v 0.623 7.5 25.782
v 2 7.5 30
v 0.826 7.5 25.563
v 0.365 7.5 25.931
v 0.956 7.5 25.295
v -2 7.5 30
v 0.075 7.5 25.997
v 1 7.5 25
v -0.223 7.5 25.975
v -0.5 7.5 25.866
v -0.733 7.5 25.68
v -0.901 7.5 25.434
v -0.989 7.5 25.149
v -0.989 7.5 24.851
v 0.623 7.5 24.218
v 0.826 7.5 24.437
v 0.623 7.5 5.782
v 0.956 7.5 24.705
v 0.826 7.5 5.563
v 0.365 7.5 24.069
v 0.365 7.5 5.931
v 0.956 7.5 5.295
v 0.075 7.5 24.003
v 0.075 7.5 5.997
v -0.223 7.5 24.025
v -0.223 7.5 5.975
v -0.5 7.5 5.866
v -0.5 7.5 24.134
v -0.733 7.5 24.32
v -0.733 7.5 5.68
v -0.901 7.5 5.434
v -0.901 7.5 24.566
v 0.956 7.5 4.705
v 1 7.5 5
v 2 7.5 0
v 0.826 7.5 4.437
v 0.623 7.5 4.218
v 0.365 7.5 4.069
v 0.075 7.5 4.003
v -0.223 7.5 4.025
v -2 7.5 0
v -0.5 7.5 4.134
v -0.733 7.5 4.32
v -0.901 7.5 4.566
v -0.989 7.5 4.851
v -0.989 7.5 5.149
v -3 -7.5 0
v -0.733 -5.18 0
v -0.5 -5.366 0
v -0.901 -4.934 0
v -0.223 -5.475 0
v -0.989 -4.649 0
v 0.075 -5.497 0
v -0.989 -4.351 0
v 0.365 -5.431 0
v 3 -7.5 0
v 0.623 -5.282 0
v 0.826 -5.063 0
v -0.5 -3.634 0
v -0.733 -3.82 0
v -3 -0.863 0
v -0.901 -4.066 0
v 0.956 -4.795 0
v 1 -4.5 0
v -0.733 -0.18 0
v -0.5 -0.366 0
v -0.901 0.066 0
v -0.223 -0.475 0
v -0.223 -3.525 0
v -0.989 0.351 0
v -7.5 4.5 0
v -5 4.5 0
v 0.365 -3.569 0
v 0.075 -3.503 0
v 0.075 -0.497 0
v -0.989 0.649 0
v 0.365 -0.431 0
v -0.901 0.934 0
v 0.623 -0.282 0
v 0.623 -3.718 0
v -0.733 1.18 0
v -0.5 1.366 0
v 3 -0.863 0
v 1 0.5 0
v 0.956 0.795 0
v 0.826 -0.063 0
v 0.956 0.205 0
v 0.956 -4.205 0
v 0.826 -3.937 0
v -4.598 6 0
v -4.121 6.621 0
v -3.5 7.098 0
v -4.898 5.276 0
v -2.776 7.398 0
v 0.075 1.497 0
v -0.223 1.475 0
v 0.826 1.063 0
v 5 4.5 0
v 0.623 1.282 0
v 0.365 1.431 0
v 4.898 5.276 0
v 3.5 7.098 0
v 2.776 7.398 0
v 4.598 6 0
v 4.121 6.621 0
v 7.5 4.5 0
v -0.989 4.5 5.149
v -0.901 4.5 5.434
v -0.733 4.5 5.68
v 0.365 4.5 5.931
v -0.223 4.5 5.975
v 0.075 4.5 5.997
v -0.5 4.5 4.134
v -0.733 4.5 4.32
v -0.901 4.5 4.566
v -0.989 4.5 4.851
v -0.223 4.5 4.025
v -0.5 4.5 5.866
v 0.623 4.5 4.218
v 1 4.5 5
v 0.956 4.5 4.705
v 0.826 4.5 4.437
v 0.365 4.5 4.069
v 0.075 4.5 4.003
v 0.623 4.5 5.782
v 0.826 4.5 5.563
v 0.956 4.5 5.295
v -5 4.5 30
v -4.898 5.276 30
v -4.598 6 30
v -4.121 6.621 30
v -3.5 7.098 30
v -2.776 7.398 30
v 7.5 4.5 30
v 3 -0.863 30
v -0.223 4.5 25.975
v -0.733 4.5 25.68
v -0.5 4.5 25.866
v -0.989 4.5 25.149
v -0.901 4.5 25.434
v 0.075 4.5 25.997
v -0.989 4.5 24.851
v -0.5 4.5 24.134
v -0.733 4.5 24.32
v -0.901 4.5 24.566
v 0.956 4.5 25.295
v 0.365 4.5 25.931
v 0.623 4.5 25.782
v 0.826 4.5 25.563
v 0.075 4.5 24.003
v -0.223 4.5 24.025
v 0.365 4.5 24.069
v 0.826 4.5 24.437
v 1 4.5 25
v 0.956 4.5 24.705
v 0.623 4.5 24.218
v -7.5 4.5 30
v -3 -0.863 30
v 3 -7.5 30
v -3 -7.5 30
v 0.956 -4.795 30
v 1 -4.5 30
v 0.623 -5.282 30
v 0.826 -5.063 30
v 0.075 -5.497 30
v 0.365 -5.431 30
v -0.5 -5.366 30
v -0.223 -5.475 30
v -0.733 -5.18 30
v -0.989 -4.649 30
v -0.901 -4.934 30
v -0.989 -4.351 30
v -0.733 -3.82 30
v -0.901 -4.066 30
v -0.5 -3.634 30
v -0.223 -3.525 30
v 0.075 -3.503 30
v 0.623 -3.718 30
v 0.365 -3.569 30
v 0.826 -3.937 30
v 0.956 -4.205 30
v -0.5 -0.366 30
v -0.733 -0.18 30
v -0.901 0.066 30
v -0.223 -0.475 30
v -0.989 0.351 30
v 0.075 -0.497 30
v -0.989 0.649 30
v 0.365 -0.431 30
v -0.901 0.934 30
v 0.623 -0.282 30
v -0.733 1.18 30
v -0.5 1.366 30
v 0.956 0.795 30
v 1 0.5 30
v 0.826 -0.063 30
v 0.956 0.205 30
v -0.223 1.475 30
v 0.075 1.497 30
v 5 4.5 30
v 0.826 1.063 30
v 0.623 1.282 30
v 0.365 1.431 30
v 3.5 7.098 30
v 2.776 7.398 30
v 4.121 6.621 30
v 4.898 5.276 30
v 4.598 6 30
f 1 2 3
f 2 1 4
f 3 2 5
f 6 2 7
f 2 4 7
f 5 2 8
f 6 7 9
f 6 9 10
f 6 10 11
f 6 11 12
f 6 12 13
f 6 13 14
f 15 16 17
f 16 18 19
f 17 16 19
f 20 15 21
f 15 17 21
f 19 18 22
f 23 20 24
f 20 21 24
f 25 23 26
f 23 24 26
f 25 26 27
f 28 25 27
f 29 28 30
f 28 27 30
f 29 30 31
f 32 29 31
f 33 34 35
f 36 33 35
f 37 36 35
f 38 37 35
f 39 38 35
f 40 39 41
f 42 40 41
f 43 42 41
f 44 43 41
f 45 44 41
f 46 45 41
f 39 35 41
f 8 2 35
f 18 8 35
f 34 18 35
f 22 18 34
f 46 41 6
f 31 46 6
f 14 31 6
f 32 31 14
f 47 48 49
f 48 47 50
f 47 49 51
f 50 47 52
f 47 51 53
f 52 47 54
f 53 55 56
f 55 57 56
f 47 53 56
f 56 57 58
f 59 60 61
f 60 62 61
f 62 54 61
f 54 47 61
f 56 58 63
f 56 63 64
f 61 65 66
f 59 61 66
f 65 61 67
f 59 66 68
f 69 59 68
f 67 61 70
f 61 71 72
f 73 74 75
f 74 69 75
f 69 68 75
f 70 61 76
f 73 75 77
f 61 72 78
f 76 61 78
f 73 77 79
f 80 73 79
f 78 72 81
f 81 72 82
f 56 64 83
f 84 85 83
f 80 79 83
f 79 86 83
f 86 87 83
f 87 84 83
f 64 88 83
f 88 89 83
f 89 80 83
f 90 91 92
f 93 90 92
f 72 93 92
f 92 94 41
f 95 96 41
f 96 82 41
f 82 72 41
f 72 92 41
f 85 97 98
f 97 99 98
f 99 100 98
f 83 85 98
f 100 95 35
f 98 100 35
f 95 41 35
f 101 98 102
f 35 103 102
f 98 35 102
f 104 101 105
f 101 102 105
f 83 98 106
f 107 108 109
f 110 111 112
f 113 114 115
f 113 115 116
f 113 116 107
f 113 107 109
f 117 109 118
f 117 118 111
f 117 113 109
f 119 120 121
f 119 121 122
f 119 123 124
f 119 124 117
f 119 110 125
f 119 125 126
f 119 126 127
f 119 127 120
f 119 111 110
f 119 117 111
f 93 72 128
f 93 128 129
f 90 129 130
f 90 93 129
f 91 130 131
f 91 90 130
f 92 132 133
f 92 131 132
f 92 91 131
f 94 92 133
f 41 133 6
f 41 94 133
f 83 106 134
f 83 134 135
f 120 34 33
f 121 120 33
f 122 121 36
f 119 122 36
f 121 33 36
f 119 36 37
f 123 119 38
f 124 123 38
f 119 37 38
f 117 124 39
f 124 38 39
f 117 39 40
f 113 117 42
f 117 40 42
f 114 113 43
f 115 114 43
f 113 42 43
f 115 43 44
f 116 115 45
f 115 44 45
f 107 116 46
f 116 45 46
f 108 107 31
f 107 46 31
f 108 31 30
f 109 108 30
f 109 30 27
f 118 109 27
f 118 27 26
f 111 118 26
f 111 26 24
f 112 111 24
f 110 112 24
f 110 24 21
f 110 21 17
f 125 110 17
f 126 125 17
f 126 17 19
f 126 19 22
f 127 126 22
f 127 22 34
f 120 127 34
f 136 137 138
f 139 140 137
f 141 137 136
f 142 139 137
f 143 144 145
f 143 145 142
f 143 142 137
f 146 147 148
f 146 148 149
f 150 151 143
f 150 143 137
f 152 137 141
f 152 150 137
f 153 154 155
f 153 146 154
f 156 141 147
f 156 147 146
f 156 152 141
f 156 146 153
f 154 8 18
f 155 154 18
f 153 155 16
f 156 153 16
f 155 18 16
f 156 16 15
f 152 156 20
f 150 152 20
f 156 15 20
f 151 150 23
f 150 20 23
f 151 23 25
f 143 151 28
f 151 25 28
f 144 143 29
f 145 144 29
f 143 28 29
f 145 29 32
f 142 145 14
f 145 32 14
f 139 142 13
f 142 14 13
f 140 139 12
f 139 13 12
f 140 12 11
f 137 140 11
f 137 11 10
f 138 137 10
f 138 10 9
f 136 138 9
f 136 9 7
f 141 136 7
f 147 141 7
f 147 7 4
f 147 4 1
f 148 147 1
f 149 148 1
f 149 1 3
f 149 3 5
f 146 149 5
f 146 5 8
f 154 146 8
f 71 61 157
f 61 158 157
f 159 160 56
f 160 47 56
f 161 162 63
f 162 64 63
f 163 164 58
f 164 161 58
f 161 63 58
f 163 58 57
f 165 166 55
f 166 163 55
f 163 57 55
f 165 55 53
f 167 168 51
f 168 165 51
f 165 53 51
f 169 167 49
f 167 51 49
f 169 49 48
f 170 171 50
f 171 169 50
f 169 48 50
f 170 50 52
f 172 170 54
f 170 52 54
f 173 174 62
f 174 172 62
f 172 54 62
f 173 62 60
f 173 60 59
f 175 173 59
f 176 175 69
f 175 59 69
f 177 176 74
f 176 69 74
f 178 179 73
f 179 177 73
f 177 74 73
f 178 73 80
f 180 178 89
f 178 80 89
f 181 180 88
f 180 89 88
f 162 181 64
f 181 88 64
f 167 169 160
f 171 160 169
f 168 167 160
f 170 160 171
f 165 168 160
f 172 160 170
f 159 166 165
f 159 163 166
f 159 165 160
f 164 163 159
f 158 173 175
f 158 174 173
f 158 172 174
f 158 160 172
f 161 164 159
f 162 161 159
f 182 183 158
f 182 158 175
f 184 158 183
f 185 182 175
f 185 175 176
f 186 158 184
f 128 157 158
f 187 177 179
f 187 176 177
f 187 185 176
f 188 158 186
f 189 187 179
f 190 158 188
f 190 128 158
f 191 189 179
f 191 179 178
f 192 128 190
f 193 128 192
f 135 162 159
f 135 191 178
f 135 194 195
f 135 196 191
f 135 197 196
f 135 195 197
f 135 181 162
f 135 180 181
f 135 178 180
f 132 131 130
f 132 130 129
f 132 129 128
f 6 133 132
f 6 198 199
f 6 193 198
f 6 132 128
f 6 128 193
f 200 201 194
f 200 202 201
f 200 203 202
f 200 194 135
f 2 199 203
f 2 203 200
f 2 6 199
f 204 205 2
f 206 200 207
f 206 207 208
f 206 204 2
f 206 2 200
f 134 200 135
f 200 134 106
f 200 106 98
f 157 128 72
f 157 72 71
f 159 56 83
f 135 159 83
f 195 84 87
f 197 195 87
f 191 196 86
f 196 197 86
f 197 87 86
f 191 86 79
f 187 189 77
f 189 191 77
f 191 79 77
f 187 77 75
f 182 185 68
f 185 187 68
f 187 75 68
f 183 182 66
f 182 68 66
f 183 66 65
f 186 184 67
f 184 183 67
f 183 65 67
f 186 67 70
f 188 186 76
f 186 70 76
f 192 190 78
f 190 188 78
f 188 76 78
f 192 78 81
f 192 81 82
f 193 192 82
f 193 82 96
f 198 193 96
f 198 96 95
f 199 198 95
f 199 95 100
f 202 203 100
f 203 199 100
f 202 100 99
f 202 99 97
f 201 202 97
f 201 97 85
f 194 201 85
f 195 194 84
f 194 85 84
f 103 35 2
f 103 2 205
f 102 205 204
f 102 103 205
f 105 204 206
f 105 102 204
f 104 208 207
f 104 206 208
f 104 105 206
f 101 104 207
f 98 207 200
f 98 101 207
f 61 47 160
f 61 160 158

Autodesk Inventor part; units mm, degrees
ref_plane "YZ Plane" through (0, 0, 0) normal (1, 0, 0) x (0, 1, 0)
ref_plane "XZ Plane" through (0, 0, 0) normal (0, 1, 0) x (-1, 0, 0)
ref_plane "XY Plane" through (0, 0, 0) normal (0, 0, 1) x (1, 0, 0)
sketch "Sketch1" plane through (0, 0, 0) normal (0, 0, 1) x (1, 0, 0)
  line L0 (2, 7.5) -> (-2, 7.5)
  line L1 (-5, 4.5) -> (-5, -7.5)
  line L2 (-5, -7.5) -> (5, -7.5)
  line L3 (5, -7.5) -> (5, 4.5)
  line L4 (5, 7.5) -> (-5, -7.5) construction
  line L5 (-5, 7.5) -> (5, -7.5) construction
  arc A0 (-2, 7.5) -> (-5, 4.5) centre (-2, 4.5) ccw
  arc A1 (5, 4.5) -> (2, 7.5) centre (2, 4.5) ccw
  circle A2 centre (0, -4.5) radius 1
  circle A3 centre (0, 0.5) radius 1
  line L6 (-10.3044, 3.5) -> (10.8002, 3.5) construction
  line L7 (-3, -7.5) -> (-3, 3.5)
  line L8 (-3, 3.5) -> (-5, 3.5)
  line L9 (3, -7.5) -> (3, 3.5)
  line L10 (3, 3.5) -> (5, 3.5)
  point P0 (0, 0)
  point P1 (0, 7.5)
  dimension "d0" = 10
  dimension "d1" = 15
  dimension "d2" = 3
  dimension "d3" = 2
  dimension "d4" = 2
  dimension "d5" = 3
  dimension "d6" = 5
  dimension "d9" = 3
  dimension "d10" = 3
  dimension "d11" = 3
extrude "Extrusion1" add sketch "Sketch1" along normal blind 30 contours A1 L3 L10 L9 L2 L7 L8 L1 A0 L0
chamfer "Chamfer1" distance 3.4641 angle 30 1 edges at (3, 3.5, 15) measured on face at (3, -3.8333, 10)
chamfer "Chamfer2" distance 3.4641 angle 30 1 edges at (-3, 3.5, 15) measured on face at (-3, -0.1667, 10)
sketch "Sketch2" plane through (-2, 7.5, 0) normal (0, 1, 0) x (1, 0, 0)
  circle A0 centre (2, -25) radius 1
  circle A1 centre (2, -5) radius 1
  line L0 (4, 0) -> (0, 0) projected
  line L1 (4, -30) -> (0, -30) projected
  point P0 (2, 0)
  point P1 (2, 0)
  point P2 (2, 0)
  dimension "d19" = 2
  dimension "d20" = 2
  dimension "d21" = 5
  dimension "d22" = 5
extrude "Extrusion2" cut sketch "Sketch2" against normal blind 3
sketch "Sketch3" plane through (0, 0, 30) normal (0, 0, 1) x (1, 0, 0)
  line L0 (-3, -7.5) -> (3, -7.5) projected
  line L1 (3, -7.5) -> (7.5, -7.5) construction
  line L2 (7.5, -7.5) -> (7.5, 4.5) construction
  line L3 (7.5, 4.5) -> (5, 4.5) construction
  line L4 (3, 4.5) -> (3, -7.5) construction
  line L5 (7.5, 4.5) -> (3, -0.8629)
  line L6 (7.5, 4.5) -> (13.864, 4.5) construction
  line L7 (7.5, 4.5) -> (5, 4.5)
  line L8 (5, 3.5) -> (3, 0.0359) projected
  line L9 (5, 3.5) -> (5, 4.5) projected
  line L10 (3, -7.5) -> (3, 0.0359) projected
  point P0 (0, 0)
  dimension "d25" = 4.5
  dimension "d26" = 12
  dimension "d27" = 130
extrude "Extrusion3" add sketch "Sketch3" against normal up to surface (30 mm away)
mirror "Mirror2" about plane through (0, 0, 0) normal (1, 0, 0) of "Extrusion3"
properties part number "Foot_V1"
